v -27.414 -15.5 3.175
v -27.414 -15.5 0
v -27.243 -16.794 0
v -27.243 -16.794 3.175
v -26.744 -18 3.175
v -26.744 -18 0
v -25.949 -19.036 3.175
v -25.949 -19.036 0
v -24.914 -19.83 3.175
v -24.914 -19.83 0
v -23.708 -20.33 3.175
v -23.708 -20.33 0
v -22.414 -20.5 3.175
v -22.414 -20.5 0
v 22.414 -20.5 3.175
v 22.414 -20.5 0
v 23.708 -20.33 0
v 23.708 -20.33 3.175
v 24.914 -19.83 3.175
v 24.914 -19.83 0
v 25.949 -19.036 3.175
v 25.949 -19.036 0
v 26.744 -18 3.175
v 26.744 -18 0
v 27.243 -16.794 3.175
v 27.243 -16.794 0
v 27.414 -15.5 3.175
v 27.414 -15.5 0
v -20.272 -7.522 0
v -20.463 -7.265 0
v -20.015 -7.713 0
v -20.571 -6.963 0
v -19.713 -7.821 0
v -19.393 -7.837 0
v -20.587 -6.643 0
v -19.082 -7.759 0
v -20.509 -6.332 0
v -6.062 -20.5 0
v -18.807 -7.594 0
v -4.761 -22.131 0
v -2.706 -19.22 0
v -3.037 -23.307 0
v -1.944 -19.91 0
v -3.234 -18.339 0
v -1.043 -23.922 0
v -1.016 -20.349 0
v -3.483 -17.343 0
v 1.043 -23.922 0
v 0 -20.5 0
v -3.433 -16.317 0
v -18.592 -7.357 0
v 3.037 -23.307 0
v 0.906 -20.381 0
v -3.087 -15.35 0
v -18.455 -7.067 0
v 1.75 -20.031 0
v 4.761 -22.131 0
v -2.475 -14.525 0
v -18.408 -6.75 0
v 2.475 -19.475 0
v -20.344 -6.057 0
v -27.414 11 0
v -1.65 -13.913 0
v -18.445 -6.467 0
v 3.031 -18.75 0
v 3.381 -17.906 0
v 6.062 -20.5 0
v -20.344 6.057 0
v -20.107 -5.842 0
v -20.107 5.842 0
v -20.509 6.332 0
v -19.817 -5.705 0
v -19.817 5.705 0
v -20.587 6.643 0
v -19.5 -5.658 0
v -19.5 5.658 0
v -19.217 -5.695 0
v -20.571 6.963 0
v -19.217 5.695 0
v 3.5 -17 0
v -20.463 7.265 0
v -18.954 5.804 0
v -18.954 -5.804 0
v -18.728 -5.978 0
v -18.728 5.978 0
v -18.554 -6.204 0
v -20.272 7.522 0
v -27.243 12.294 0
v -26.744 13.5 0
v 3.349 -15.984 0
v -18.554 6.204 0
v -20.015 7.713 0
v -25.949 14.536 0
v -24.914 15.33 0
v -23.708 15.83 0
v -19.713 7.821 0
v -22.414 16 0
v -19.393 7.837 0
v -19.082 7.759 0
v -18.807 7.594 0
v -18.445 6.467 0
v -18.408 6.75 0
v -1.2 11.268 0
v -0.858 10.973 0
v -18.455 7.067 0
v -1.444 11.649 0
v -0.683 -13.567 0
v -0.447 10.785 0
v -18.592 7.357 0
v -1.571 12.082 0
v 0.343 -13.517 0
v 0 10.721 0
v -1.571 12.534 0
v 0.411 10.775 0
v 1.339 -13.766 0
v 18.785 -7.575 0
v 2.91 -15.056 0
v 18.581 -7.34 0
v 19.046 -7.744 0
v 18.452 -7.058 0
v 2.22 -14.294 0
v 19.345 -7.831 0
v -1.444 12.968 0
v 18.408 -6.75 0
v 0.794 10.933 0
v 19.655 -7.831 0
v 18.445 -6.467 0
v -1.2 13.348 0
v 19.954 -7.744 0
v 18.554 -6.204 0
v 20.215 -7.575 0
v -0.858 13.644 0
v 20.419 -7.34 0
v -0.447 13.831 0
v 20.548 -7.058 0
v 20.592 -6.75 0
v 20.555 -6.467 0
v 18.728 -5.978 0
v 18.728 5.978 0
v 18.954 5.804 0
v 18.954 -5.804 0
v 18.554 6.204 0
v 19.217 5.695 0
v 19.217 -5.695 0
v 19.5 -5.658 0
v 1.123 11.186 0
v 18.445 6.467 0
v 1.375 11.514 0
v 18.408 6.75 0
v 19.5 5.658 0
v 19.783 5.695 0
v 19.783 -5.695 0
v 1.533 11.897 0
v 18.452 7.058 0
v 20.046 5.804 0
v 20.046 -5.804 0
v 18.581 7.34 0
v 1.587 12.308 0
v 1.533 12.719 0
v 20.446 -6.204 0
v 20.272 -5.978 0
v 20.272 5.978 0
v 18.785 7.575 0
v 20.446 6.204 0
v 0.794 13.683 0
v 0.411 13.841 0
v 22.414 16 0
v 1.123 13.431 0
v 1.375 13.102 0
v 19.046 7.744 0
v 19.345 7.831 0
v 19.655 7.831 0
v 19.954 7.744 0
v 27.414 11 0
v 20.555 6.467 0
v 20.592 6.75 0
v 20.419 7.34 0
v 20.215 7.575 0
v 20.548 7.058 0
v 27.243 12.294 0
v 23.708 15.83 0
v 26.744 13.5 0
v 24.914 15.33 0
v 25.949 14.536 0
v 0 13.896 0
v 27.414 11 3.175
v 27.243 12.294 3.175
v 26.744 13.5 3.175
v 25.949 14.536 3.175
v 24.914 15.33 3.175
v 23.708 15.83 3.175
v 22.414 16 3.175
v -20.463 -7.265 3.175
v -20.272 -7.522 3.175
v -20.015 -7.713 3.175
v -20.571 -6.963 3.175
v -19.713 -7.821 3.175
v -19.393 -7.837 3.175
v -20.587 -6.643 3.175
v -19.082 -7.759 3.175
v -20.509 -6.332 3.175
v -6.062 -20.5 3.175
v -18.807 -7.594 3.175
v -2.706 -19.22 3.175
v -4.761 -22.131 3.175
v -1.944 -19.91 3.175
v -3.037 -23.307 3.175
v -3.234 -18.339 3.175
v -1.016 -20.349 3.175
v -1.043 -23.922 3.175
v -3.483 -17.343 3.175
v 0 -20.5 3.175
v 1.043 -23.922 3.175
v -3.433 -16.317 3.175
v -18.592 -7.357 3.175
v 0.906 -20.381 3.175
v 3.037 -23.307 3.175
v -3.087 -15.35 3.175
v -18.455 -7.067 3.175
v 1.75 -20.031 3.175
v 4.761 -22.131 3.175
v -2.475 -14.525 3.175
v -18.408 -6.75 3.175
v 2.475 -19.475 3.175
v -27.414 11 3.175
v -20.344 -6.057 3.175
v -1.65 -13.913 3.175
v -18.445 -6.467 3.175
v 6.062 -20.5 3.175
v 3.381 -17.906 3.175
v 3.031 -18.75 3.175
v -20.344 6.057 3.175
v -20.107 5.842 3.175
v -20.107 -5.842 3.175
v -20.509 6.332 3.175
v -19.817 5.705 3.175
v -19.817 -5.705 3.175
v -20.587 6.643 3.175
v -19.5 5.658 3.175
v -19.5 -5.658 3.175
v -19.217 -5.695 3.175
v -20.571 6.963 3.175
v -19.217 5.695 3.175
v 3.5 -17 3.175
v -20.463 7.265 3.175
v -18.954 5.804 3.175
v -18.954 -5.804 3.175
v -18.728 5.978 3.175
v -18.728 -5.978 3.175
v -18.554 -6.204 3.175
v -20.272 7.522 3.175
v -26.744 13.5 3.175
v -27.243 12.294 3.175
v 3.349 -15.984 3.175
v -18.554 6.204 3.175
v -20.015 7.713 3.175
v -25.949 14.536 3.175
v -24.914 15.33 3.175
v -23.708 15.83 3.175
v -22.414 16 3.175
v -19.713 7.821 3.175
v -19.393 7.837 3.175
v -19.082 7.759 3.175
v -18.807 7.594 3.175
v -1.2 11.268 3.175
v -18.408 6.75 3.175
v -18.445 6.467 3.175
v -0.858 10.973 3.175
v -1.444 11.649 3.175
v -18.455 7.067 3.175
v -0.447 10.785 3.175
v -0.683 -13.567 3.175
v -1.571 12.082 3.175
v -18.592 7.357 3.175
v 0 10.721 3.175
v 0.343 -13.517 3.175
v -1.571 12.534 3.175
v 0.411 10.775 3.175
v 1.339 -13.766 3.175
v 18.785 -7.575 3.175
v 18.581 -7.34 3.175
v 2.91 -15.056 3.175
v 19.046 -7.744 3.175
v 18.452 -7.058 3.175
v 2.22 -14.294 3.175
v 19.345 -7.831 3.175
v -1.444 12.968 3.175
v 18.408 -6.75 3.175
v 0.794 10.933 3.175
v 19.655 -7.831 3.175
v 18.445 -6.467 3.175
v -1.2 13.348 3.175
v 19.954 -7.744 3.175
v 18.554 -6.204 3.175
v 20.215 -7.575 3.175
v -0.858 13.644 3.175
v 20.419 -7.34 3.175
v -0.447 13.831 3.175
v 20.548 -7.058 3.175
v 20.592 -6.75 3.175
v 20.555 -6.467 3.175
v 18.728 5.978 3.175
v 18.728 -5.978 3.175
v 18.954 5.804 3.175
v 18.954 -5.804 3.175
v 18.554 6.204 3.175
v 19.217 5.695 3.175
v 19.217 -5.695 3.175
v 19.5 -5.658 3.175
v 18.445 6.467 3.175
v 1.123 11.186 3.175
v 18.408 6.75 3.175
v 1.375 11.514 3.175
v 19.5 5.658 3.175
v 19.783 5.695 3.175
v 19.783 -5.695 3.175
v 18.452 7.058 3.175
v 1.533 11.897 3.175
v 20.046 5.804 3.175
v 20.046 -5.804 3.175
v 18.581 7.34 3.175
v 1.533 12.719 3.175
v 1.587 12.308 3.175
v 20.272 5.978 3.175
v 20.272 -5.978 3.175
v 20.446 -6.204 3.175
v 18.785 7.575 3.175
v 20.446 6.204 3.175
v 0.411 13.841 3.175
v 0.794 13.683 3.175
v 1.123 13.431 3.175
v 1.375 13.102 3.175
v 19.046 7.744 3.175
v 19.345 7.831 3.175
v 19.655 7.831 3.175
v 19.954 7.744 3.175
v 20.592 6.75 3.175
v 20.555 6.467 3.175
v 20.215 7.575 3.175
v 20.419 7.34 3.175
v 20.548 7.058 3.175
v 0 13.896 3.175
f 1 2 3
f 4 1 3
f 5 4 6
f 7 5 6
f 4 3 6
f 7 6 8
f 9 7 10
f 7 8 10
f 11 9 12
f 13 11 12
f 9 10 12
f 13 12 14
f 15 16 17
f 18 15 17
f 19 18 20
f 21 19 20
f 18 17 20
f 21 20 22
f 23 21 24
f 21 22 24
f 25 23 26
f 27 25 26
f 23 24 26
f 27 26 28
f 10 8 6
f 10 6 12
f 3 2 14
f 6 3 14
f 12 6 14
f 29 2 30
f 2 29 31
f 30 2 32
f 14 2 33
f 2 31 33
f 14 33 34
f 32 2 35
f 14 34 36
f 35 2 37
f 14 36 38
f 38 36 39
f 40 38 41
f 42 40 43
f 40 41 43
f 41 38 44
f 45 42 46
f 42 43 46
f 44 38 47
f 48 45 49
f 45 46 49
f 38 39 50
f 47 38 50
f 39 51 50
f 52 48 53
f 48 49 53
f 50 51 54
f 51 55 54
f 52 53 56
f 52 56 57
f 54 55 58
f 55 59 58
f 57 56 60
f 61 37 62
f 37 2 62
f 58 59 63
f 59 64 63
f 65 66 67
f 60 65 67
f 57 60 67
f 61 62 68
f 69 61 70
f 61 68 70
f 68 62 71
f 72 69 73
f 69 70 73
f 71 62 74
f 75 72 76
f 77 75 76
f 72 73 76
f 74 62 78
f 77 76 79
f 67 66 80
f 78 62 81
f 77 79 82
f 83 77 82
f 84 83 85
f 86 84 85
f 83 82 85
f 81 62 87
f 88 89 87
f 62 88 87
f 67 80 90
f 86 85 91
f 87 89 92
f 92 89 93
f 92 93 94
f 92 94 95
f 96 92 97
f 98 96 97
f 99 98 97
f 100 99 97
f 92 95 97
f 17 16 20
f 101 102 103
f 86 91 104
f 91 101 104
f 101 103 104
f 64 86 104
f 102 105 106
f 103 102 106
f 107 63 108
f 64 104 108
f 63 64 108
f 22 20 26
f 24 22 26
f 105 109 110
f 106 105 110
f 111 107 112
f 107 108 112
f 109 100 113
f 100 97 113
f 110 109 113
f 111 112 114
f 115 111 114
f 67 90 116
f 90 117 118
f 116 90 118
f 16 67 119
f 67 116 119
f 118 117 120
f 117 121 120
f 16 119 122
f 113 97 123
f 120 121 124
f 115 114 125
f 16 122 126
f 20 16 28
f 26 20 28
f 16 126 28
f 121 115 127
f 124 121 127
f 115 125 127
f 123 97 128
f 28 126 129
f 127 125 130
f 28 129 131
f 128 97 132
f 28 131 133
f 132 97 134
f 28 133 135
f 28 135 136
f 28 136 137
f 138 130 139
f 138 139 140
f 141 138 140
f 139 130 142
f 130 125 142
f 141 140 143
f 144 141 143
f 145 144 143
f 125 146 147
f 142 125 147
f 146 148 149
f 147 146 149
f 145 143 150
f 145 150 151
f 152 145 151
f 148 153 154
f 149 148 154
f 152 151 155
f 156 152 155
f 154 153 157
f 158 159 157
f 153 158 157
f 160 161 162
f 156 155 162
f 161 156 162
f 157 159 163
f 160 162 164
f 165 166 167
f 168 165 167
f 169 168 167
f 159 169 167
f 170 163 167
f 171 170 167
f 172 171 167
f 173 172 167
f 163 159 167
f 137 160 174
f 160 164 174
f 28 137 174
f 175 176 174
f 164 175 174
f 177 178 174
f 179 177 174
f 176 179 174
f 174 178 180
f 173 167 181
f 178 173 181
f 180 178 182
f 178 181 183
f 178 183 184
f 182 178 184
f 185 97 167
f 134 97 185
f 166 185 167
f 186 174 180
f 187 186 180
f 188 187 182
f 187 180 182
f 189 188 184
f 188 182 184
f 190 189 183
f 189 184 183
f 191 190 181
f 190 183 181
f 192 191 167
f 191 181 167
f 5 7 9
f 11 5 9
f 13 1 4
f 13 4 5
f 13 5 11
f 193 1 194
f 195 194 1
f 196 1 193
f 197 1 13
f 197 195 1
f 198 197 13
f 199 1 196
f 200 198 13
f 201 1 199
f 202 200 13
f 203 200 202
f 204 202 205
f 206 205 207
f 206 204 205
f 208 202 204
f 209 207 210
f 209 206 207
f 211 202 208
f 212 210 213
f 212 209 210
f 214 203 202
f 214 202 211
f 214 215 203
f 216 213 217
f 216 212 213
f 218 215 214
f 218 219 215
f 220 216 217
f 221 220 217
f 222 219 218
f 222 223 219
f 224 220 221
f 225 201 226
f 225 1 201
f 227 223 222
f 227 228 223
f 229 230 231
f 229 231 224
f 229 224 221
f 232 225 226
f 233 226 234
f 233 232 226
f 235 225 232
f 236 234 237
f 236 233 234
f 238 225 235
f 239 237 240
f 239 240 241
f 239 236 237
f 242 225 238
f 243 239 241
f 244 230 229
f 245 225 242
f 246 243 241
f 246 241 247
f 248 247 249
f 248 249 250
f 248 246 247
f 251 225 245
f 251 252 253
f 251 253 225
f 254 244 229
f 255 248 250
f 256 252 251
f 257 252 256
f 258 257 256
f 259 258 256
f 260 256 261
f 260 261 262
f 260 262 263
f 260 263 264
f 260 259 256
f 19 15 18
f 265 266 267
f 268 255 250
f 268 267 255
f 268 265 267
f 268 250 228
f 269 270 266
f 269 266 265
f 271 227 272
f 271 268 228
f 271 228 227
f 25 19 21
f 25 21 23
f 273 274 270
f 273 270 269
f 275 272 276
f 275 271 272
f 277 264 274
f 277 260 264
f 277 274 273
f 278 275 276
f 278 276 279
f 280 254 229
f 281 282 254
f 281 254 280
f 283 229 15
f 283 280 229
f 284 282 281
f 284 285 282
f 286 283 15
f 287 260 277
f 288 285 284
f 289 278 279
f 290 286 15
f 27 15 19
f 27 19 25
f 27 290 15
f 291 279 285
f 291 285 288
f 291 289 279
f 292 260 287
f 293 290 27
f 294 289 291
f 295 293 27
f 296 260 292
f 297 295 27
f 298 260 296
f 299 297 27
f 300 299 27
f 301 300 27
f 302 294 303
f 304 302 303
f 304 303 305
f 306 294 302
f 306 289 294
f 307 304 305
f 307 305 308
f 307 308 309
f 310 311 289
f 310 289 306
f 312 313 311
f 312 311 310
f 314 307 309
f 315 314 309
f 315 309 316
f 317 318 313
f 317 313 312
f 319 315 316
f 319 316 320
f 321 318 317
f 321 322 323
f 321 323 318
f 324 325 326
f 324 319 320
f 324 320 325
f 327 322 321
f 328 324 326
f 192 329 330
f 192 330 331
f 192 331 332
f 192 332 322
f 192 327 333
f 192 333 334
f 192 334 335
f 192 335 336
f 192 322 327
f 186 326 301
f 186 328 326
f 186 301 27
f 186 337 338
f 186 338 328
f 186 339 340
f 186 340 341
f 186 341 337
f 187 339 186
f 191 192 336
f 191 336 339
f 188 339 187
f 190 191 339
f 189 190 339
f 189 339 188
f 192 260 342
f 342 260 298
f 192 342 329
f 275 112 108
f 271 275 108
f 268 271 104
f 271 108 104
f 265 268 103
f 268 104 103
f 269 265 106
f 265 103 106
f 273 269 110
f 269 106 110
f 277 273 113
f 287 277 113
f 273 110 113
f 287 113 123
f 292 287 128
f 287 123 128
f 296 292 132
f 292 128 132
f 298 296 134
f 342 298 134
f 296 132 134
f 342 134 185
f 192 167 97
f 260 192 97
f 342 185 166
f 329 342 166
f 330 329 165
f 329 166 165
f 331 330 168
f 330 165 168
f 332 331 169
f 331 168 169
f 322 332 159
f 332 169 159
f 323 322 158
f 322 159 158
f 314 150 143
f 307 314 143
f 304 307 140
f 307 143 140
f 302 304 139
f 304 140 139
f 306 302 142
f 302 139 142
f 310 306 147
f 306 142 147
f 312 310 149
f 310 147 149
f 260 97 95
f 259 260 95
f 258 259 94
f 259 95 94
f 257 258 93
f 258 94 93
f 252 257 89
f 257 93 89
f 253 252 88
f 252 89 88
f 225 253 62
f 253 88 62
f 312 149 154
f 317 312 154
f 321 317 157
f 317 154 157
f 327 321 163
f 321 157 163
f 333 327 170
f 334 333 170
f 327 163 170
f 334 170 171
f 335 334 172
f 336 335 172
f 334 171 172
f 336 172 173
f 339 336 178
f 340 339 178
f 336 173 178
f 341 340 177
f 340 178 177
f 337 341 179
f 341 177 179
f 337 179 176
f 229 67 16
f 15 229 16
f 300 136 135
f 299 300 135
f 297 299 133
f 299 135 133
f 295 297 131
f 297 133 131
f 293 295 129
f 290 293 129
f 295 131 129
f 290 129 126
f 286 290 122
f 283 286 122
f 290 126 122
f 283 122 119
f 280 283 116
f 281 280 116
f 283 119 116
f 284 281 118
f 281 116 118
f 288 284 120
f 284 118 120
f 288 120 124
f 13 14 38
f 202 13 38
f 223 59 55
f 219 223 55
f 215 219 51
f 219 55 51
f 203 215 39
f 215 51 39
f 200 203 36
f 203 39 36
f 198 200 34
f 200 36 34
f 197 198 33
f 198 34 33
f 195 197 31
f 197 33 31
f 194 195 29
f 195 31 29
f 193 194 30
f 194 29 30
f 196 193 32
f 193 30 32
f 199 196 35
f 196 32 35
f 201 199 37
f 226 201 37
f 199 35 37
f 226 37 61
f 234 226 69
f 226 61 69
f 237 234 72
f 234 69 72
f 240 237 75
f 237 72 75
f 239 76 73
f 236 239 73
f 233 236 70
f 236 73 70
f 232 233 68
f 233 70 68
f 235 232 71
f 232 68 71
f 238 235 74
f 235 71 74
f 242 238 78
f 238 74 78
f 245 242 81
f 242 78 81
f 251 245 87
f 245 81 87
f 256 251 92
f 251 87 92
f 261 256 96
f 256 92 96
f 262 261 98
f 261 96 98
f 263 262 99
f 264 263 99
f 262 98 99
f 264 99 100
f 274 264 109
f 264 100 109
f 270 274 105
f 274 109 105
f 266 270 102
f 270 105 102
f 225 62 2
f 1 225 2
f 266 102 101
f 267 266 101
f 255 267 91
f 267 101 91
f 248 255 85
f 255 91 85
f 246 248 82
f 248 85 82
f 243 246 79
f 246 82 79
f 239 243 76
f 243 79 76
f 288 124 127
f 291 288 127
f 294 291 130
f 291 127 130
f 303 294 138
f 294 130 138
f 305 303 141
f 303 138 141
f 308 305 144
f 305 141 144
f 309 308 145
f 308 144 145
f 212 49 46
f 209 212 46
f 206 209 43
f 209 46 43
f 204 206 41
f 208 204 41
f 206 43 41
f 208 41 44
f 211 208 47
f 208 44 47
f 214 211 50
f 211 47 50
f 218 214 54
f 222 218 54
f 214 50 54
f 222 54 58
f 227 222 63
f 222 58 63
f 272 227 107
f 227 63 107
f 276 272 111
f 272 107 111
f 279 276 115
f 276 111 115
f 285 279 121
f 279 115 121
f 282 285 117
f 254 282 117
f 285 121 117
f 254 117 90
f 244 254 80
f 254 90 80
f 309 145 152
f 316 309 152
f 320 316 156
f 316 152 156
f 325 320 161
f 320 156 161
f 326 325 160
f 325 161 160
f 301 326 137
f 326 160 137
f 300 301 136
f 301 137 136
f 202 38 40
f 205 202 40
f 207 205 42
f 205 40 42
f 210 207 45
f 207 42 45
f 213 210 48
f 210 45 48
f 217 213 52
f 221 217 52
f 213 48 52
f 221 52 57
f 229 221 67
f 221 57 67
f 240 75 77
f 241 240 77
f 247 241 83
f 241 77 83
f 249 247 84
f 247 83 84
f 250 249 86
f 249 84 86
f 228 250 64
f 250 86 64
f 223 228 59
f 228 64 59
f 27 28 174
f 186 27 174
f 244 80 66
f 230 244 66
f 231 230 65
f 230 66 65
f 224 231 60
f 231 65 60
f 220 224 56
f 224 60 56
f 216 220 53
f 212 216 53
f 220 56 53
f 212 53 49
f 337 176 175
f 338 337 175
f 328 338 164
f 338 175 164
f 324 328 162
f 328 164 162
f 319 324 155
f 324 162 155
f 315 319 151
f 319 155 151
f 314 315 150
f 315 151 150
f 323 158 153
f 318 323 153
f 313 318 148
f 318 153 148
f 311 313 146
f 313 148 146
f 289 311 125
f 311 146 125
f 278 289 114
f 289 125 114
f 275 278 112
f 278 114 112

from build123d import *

# Parameters (mm, degrees)
F1_DEPTH = 3.175


# Not quite as in the source:
# - a length typed as a fraction of an inch, garbled in the dataset ("3 / 203.2 mm" for 3/8 in), is restored
# - a feature names something its author has since deleted; it is built from what else it names


with BuildPart() as f1:
    # F0 (on Top) → F1 (new body)
    with BuildSketch(Plane.XY):
        with BuildLine():
            Line((22.4136457592, 16), (0, 16))
            Line((0, 16), (-22.4136457592, 16))
            ThreePointArc((-22.4136457592, 16), (-25.9491796652, 14.5355339059), (-27.4136457592, 11))
            Line((-27.4136457592, 11), (-27.4136457592, -15.5))
            ThreePointArc((-27.4136457592, -15.5), (-25.9491796652, -19.0355339059), (-22.4136457592, -20.5))
            Line((-22.4136457592, -20.5), (-6.0621778265, -20.5))
            ThreePointArc((-6.0621778265, -20.5), (-1.8117333157, -10.238519216), (7, -17))
            ThreePointArc((7, -17), (6.761480784, -18.8117333157), (6.0621778265, -20.5))
            Line((6.0621778265, -20.5), (22.4136457592, -20.5))
            ThreePointArc((22.4136457592, -20.5), (25.9491796652, -19.0355339059), (27.4136457592, -15.5))
            Line((27.4136457592, -15.5), (27.4136457592, 11))
            ThreePointArc((27.4136457592, 11), (25.9491796652, 14.5355339059), (22.4136457592, 16))
        make_face()
        Polygon((22, 9), (22, -9), (-22, -9), (-22, 9), (0, 9), align=None, mode=Mode.SUBTRACT)
        with BuildLine():
            ThreePointArc((1.5875, 12.3080683509), (1.1225320151, 11.1855363358), (0, 10.7205683509))
            ThreePointArc((0, 10.7205683509), (-1.5875, 12.3080683509), (0, 13.8955683509))
            ThreePointArc((0, 13.8955683509), (1.1225320151, 13.4306003661), (1.5875, 12.3080683509))
        make_face(mode=Mode.SUBTRACT)
        Polygon((-22, -9), (22, -9), (22, 9), (0, 9), (-22, 9), align=None)
        with BuildLine():
            Line((-18.4078, 6.75), (0, 6.75))
            Line((0, 6.75), (18.4078, 6.75))
            ThreePointArc((18.4078, 6.75), (19.5, 7.8422), (20.5922, 6.75))
            ThreePointArc((20.5922, 6.75), (20.2723020264, 5.9776979736), (19.5, 5.6578))
            Line((19.5, 5.6578), (19.5, -5.6578))
            ThreePointArc((19.5, -5.6578), (20.2723020264, -5.9776979736), (20.5922, -6.75))
            ThreePointArc((20.5922, -6.75), (19.5, -7.8422), (18.4078, -6.75))
            Line((18.4078, -6.75), (-18.4078, -6.75))
            ThreePointArc((-18.4078, -6.75), (-20.2723020264, -7.5223020264), (-19.5, -5.6578))
            Line((-19.5, -5.6578), (-19.5, 5.6578))
            ThreePointArc((-19.5, 5.6578), (-20.2723020264, 7.5223020264), (-18.4078, 6.75))
        make_face(mode=Mode.SUBTRACT)
        with BuildLine():
            Line((18.4078, 6.75), (0, 6.75))
            Line((0, 6.75), (-18.4078, 6.75))
            ThreePointArc((-18.4078, 6.75), (-18.7276979736, 5.9776979736), (-19.5, 5.6578))
            Line((-19.5, 5.6578), (-19.5, -5.6578))
            ThreePointArc((-19.5, -5.6578), (-18.7276979736, -5.9776979736), (-18.4078, -6.75))
            Line((-18.4078, -6.75), (18.4078, -6.75))
            ThreePointArc((18.4078, -6.75), (18.7276979736, -5.9776979736), (19.5, -5.6578))
            Line((19.5, -5.6578), (19.5, 5.6578))
            ThreePointArc((19.5, 5.6578), (18.7276979736, 5.9776979736), (18.4078, 6.75))
        make_face()
        with BuildLine():
            ThreePointArc((7, -17), (-1.8117333157, -10.238519216), (-6.0621778265, -20.5))
            Line((-6.0621778265, -20.5), (2.55e-08, -20.5))
            Line((2.55e-08, -20.5), (6.0621778265, -20.5))
            ThreePointArc((6.0621778265, -20.5), (6.761480784, -18.8117333157), (7, -17))
        make_face()
        with BuildLine():
            ThreePointArc((3.5, -17), (2.4748737432, -19.4748737251), (2.55e-08, -20.5))
            ThreePointArc((2.55e-08, -20.5), (-2.4748737432, -14.5251262749), (3.5, -17))
        make_face(mode=Mode.SUBTRACT)
        with BuildLine():
            Line((2.55e-08, -20.5), (-6.0621778265, -20.5))
            ThreePointArc((-6.0621778265, -20.5), (0, -24), (6.0621778265, -20.5))
            Line((6.0621778265, -20.5), (2.55e-08, -20.5))
        make_face()
    extrude(amount=F1_DEPTH)


solid = f1.part
